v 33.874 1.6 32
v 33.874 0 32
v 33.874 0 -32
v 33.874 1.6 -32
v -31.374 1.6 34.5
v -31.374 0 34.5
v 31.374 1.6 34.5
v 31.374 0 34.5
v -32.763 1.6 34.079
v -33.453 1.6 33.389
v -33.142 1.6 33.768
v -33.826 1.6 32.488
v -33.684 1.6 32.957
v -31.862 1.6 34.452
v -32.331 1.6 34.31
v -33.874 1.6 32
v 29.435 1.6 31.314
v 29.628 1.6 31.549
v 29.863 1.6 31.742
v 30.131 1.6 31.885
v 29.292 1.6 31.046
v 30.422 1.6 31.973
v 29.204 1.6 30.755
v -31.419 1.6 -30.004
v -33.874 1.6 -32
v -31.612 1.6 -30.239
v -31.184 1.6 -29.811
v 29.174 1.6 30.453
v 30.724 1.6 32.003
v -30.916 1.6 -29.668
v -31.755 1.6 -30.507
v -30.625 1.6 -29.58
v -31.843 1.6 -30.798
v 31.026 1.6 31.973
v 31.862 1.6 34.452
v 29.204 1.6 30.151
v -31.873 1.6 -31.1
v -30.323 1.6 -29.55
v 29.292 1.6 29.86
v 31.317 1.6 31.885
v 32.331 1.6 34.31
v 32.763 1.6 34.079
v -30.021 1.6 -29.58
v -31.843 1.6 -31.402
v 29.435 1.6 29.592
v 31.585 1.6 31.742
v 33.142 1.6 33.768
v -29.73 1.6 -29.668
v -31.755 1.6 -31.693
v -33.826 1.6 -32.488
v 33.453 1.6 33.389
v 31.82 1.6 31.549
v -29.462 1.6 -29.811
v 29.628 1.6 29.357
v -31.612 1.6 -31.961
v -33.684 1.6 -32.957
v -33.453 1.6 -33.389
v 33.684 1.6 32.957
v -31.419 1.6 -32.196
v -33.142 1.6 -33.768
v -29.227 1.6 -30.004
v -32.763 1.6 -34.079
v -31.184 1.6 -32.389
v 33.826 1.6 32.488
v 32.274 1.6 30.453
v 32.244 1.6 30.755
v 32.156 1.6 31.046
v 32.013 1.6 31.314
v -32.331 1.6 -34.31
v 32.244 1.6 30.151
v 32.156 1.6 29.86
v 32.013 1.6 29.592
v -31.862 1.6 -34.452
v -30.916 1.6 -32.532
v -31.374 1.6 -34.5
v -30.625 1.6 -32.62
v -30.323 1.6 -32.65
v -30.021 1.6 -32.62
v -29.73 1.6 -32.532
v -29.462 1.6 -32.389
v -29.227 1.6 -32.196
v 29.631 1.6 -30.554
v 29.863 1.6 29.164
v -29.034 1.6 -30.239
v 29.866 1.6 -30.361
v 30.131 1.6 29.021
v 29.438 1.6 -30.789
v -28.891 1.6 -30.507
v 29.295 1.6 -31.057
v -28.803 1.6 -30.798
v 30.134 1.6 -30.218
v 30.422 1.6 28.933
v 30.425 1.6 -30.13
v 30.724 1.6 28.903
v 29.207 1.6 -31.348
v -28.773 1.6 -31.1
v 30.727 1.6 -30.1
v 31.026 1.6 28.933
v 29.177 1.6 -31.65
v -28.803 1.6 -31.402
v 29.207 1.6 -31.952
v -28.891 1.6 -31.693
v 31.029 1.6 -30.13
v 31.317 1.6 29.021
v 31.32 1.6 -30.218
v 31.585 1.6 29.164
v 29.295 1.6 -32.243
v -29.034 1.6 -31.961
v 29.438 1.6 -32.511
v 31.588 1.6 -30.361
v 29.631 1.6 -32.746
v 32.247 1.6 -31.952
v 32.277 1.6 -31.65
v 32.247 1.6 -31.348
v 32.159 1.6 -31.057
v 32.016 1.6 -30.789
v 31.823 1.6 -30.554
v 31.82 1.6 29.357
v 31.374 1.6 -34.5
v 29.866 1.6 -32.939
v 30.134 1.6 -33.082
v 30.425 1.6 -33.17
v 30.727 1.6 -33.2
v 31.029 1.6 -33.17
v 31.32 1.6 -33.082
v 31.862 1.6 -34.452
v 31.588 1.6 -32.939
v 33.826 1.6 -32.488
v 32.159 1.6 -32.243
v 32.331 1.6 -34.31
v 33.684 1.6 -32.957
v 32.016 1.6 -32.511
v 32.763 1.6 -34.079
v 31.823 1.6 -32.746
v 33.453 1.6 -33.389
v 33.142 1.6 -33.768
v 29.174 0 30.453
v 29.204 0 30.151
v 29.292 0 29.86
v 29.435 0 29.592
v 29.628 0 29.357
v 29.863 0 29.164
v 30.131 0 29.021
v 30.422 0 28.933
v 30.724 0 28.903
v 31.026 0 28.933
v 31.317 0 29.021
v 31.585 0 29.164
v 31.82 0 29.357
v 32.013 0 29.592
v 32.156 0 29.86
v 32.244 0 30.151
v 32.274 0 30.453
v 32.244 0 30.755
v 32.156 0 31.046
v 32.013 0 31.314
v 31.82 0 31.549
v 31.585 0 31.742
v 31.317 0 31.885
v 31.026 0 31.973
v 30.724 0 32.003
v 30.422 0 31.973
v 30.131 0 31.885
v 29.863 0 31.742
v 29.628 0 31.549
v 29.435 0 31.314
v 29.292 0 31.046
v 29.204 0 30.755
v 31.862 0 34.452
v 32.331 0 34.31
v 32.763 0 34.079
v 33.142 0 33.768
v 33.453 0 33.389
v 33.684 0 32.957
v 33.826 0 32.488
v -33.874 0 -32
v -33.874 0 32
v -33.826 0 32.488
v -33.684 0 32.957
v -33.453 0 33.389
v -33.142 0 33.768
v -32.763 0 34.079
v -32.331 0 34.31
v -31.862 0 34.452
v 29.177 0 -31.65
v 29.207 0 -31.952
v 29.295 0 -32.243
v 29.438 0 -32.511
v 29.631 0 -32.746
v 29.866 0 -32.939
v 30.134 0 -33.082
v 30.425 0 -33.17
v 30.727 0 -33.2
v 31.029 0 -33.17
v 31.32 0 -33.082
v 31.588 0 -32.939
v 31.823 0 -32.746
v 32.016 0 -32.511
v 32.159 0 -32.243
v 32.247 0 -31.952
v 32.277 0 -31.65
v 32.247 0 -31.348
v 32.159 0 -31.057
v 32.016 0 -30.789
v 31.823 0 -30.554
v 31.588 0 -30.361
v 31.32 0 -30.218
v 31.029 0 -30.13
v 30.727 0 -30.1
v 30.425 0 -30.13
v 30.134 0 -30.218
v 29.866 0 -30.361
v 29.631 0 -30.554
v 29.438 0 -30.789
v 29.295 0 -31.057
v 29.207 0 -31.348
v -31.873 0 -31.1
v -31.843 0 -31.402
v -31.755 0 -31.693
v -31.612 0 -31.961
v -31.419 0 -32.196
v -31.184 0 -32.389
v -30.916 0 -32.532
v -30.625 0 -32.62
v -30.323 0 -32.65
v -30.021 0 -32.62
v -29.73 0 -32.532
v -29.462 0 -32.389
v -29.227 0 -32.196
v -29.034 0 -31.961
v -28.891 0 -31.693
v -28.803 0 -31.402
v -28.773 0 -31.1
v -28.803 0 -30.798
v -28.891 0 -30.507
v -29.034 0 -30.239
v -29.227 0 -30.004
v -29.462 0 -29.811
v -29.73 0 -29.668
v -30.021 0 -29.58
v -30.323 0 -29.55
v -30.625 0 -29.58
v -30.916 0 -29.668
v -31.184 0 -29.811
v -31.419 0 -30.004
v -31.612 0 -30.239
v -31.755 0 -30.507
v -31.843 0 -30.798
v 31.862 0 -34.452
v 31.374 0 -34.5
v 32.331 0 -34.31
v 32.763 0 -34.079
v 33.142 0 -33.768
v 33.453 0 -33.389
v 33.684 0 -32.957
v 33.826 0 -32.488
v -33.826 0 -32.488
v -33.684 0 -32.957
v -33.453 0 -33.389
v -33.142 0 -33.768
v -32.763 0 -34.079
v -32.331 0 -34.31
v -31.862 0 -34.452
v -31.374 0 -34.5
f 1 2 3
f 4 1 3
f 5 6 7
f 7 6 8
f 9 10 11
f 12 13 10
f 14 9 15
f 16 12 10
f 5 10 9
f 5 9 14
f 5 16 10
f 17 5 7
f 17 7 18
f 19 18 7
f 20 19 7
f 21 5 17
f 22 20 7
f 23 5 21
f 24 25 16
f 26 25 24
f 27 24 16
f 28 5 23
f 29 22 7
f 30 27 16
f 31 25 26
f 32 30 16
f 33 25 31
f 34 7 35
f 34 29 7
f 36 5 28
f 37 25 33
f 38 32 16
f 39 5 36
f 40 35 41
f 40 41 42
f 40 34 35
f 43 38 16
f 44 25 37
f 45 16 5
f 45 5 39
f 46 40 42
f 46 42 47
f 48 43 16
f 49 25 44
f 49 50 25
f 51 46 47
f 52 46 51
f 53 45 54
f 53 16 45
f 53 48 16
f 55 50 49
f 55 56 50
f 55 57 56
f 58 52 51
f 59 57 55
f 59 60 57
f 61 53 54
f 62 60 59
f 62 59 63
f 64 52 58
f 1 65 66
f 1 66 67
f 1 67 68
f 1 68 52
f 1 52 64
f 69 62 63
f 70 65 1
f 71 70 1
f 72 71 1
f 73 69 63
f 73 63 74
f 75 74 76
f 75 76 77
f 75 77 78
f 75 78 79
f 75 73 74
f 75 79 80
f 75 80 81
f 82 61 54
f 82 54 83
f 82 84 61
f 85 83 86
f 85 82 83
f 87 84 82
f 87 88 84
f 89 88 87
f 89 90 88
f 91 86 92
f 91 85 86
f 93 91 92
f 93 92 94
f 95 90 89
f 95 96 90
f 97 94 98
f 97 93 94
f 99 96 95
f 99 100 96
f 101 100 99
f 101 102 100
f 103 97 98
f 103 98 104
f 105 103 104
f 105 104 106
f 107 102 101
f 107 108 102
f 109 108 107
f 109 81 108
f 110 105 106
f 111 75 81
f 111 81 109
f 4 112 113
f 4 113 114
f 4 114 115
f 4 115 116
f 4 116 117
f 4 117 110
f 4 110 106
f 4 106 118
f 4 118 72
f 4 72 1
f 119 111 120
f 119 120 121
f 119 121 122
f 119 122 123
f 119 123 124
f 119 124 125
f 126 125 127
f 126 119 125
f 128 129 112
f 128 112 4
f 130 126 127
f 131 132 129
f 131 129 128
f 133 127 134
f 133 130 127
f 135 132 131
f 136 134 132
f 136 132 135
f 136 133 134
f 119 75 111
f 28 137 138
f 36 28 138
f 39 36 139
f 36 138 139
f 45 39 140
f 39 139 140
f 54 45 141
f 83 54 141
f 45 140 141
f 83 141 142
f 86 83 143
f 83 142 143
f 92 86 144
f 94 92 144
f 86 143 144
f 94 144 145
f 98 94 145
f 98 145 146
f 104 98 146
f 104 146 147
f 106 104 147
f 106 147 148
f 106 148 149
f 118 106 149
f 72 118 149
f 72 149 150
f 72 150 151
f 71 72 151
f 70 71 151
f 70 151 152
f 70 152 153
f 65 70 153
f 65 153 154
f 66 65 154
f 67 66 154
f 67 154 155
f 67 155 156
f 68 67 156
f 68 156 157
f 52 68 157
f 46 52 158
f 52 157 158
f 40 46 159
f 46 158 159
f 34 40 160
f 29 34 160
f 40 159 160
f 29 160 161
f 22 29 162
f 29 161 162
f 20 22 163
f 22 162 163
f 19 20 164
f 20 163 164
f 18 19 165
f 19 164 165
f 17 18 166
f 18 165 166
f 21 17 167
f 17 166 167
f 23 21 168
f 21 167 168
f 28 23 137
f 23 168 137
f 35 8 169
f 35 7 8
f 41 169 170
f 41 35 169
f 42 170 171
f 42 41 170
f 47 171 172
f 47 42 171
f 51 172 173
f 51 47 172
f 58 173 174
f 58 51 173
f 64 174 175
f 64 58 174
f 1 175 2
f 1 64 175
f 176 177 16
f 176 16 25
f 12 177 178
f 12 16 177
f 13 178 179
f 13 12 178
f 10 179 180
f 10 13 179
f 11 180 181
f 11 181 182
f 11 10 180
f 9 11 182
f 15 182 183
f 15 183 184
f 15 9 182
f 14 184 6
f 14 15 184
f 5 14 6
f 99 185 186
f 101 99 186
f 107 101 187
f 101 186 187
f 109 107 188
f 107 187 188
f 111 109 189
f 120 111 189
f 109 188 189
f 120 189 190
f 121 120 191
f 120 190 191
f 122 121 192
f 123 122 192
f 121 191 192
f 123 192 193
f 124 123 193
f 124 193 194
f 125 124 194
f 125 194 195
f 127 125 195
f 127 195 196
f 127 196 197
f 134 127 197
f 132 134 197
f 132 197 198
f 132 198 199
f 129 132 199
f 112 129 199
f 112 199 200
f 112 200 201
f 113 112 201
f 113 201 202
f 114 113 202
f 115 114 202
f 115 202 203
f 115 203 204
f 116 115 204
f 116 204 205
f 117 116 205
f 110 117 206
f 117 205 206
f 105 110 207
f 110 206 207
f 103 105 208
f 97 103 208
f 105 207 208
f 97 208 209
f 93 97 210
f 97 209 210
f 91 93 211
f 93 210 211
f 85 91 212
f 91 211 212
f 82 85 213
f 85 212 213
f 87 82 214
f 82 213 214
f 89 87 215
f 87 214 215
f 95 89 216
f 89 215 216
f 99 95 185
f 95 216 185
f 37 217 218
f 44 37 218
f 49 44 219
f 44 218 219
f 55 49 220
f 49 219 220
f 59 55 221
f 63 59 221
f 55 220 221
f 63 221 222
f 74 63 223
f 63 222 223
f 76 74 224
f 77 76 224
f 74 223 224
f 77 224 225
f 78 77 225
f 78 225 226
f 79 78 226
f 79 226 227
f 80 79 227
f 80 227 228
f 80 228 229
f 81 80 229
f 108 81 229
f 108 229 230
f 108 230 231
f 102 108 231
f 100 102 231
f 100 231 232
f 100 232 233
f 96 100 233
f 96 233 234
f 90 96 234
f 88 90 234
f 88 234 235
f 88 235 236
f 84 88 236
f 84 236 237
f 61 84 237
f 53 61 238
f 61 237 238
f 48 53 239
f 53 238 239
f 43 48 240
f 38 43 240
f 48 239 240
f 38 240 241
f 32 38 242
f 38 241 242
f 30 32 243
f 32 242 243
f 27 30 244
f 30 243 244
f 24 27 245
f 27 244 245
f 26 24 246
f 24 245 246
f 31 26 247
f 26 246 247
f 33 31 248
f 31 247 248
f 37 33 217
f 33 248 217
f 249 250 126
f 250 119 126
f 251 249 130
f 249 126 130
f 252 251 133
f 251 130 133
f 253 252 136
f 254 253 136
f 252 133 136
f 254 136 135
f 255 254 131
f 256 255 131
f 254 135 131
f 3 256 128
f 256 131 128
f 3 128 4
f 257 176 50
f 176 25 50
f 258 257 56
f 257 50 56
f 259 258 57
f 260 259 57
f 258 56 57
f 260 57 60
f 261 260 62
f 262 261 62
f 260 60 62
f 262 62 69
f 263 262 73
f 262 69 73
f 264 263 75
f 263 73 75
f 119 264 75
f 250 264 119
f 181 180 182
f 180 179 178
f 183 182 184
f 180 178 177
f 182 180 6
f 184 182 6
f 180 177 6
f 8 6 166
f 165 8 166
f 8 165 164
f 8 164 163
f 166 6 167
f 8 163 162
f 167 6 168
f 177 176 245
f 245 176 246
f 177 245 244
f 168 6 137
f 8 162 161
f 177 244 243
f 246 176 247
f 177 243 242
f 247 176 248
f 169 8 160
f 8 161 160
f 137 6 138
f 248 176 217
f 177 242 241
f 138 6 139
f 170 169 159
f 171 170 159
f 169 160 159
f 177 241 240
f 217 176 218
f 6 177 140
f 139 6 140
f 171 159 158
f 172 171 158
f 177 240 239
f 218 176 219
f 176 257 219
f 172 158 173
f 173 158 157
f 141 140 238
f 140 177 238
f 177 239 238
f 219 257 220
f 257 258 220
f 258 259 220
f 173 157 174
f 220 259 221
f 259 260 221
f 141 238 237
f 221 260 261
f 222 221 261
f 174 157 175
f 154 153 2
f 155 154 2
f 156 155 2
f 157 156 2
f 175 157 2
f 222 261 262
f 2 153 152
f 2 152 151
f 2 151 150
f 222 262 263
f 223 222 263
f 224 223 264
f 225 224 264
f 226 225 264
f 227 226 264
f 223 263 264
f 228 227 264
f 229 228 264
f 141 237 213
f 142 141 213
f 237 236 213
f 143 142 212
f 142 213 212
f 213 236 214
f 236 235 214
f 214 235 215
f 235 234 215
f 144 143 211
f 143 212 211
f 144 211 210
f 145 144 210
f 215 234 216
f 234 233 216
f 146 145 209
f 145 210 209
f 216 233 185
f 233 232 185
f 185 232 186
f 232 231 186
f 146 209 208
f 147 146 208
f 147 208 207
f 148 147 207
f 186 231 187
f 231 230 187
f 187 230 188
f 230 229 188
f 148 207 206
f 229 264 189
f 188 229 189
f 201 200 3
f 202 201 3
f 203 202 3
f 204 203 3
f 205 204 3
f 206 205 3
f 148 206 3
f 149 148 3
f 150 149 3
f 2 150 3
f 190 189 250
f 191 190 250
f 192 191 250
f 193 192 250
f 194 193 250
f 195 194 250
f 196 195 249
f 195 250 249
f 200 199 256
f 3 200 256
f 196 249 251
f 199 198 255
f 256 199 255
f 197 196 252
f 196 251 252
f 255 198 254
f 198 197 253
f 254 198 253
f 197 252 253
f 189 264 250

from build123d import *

# Parameters (mm, degrees)
SKETCH1_W                  = 67.748
SKETCH1_H                  = 69
BOSS_EXTRUDE1_DEPTH        = 1.6
M2_5_CLEARANCE_HOLE2_D     = 3.1
M2_5_CLEARANCE_HOLE2_DEPTH = 50.8
M2_5_CLEARANCE_HOLE2_TIP   = 0.931333959
FILLET1_R                  = 2.5


with BuildPart() as part:
    # Sketch1 → Boss-Extrude1 (new body)
    with BuildSketch(Plane(origin=(0, 0, 0), x_dir=(1, 0, 0), z_dir=(0, 1, 0))):
        Rectangle(SKETCH1_W, SKETCH1_H)
    extrude(amount=BOSS_EXTRUDE1_DEPTH)

    # M2.5 Clearance Hole2
    with Locations(Plane(origin=(0, 1.6, 0), x_dir=(1, 0, 0), z_dir=(0, 1, 0))):
        with Locations((30.724, -30.453), (-30.323, 31.1), (30.727, 31.65)):
            Hole(M2_5_CLEARANCE_HOLE2_D / 2, depth=M2_5_CLEARANCE_HOLE2_DEPTH)
            with Locations((0, 0, -(M2_5_CLEARANCE_HOLE2_DEPTH + M2_5_CLEARANCE_HOLE2_TIP / 2))):  # 118° drill point
                Cone(0, M2_5_CLEARANCE_HOLE2_D / 2, M2_5_CLEARANCE_HOLE2_TIP, mode=Mode.SUBTRACT)

    # Fillet1
    fillet1_edges = [part.edges().sort_by_distance(p)[0] for p in [
        (33.874, 0.8, 34.5),
        (-33.874, 0.8, 34.5),
        (-33.874, 0.8, -34.5),
        (33.874, 0.8, -34.5),
    ]]
    fillet(fillet1_edges, radius=FILLET1_R)


solid = part.part
